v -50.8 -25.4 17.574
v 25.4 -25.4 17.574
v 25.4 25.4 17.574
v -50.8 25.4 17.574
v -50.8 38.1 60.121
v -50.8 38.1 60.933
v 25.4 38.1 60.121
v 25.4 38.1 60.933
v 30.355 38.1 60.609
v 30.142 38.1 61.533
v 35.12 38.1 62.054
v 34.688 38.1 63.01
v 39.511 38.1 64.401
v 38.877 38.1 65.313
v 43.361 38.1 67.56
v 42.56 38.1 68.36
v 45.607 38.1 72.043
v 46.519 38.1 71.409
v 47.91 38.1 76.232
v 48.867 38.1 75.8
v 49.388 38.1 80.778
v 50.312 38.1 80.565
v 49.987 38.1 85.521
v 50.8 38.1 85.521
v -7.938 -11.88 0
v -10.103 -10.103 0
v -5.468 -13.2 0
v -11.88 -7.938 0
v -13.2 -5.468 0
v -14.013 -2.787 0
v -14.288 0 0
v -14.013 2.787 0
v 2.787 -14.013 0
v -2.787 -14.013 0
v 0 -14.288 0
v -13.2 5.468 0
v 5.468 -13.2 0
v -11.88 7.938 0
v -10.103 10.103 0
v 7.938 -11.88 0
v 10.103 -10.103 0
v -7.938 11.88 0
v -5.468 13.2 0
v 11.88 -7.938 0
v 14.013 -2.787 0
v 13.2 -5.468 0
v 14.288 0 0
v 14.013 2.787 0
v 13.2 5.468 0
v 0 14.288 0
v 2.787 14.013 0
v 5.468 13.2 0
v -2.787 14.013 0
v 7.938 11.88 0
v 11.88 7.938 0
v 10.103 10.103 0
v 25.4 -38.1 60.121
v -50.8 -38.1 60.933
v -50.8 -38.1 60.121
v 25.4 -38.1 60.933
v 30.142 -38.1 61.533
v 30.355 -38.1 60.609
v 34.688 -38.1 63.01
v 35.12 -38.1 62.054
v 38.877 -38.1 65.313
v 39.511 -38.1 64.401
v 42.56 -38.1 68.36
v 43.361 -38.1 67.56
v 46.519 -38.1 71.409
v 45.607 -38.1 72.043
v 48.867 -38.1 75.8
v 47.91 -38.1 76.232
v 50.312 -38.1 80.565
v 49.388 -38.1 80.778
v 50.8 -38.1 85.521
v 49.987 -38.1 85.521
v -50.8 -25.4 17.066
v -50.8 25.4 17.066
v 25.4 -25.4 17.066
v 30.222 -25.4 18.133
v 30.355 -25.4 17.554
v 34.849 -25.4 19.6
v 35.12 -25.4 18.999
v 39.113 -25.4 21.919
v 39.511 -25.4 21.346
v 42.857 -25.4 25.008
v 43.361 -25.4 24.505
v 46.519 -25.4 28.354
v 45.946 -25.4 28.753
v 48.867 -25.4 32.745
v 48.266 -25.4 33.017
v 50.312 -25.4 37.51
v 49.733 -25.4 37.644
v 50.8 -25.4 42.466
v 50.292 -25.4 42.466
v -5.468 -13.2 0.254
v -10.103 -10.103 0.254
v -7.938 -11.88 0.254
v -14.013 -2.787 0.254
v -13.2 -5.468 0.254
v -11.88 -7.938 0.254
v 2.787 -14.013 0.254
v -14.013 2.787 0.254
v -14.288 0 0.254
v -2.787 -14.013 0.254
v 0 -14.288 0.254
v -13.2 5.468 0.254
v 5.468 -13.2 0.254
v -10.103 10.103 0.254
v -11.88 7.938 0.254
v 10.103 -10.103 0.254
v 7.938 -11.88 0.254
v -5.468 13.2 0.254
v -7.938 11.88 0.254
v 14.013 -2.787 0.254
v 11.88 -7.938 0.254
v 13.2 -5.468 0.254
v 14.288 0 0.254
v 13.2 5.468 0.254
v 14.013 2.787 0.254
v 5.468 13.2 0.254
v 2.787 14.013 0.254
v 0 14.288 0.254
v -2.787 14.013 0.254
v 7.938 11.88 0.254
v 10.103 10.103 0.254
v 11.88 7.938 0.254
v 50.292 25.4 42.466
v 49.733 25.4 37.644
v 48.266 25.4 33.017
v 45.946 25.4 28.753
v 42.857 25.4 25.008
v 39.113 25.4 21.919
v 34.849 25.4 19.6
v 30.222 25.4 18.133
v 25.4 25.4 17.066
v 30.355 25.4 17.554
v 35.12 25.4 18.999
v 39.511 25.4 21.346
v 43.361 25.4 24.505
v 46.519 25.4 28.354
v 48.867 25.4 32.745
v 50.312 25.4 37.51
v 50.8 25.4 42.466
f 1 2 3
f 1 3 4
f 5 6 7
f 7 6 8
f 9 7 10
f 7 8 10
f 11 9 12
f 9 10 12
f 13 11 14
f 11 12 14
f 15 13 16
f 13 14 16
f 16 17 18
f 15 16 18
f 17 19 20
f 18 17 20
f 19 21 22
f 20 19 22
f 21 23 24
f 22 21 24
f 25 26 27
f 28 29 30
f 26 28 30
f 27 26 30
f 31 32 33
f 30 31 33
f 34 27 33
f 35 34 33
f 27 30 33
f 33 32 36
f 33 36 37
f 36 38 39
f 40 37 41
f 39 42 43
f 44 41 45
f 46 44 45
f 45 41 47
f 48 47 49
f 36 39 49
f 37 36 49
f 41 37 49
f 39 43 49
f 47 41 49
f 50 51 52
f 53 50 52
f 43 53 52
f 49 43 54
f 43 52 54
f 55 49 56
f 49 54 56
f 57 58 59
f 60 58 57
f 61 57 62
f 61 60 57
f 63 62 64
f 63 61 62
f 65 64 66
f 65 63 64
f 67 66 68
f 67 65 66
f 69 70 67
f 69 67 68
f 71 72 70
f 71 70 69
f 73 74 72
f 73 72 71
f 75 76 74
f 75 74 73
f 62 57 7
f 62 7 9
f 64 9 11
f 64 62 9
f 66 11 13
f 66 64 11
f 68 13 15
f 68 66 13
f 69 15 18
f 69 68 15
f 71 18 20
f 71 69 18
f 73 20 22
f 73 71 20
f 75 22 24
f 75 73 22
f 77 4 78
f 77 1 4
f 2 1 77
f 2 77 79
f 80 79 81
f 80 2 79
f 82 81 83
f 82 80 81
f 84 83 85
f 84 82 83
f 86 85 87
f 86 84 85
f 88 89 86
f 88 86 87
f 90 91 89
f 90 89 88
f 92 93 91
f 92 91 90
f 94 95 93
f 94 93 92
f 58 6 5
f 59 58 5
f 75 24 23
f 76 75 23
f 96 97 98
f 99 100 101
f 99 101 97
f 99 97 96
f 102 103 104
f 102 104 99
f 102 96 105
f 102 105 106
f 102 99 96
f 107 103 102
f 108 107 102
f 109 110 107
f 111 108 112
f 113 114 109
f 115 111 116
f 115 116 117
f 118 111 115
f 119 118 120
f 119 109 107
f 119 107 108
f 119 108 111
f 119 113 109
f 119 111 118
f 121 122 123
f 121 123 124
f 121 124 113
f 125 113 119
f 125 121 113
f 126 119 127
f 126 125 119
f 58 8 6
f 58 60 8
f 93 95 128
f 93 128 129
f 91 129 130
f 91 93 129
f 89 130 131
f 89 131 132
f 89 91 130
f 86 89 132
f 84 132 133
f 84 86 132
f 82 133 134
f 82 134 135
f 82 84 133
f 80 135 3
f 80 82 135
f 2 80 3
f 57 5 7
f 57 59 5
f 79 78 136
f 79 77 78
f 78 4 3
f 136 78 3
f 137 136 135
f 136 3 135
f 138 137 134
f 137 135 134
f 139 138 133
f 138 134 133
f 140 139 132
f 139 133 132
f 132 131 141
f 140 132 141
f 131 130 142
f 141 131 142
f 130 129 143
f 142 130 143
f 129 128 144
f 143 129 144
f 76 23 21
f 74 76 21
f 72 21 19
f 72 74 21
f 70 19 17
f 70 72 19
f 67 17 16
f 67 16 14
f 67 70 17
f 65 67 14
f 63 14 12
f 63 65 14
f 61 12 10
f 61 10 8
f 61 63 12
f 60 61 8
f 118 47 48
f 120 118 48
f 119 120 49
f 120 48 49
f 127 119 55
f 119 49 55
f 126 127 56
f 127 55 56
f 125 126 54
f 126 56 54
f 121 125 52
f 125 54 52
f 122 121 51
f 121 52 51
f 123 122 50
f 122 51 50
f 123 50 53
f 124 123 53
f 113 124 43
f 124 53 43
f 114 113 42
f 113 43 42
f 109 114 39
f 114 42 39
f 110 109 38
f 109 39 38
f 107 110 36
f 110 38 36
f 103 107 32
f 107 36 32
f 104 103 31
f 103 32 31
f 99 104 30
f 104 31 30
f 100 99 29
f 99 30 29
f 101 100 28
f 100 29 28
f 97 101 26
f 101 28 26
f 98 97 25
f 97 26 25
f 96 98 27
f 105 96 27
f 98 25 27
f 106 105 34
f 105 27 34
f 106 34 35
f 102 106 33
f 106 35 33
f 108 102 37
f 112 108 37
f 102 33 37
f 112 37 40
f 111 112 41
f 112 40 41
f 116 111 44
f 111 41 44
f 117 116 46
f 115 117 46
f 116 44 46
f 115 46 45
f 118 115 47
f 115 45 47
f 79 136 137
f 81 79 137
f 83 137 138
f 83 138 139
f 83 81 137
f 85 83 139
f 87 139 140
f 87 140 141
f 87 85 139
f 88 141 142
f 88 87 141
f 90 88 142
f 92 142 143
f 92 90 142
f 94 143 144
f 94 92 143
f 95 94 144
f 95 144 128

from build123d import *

# Parameters (mm, degrees)
F0_R     = 14.2875
F1_DEPTH = 0.254
F3_DEPTH = 25.4
F5_DEPTH = 38.1


with BuildPart() as f1:
    # F0 (on Top) → F1 (new body)
    with BuildSketch(Plane.XY):
        Circle(F0_R)
    extrude(amount=F1_DEPTH)


with BuildPart() as f3:
    # F2 (on Front) → F3 (new body, symmetric)
    with BuildSketch(Plane.XZ):
        with BuildLine():
            ThreePointArc((25.4, 17.065627), (43.360512, 24.505115), (50.8, 42.465627))
            Line((50.8, 42.465627), (50.292, 42.465627))
            ThreePointArc((50.292, 42.465627), (42.857494, 25.008133), (25.4, 17.573627))
            Line((25.4, 17.573627), (-50.8, 17.573627))
            Line((-50.8, 17.573627), (-50.8, 17.065627))
            Line((-50.8, 17.065627), (25.4, 17.065627))
        make_face()
    extrude(amount=F3_DEPTH, both=True)


with BuildPart() as f5:
    # F4 (on Front) → F5 (new body, symmetric)
    with BuildSketch(Plane.XZ):
        with BuildLine():
            Line((-50.8, 60.120524), (25.4, 60.120524))
            ThreePointArc((25.4, 60.120524), (43.360512, 67.560011), (50.8, 85.520524))
            Line((50.8, 85.520524), (49.9872, 85.520524))
            ThreePointArc((49.9872, 85.520524), (42.56032, 68.360204), (25.4, 60.933324))
            Line((25.4, 60.933324), (-50.8, 60.933324))
            Line((-50.8, 60.933324), (-50.8, 60.120524))
        make_face()
    extrude(amount=F5_DEPTH, both=True)


solid = Compound([f1.part, f3.part, f5.part])
